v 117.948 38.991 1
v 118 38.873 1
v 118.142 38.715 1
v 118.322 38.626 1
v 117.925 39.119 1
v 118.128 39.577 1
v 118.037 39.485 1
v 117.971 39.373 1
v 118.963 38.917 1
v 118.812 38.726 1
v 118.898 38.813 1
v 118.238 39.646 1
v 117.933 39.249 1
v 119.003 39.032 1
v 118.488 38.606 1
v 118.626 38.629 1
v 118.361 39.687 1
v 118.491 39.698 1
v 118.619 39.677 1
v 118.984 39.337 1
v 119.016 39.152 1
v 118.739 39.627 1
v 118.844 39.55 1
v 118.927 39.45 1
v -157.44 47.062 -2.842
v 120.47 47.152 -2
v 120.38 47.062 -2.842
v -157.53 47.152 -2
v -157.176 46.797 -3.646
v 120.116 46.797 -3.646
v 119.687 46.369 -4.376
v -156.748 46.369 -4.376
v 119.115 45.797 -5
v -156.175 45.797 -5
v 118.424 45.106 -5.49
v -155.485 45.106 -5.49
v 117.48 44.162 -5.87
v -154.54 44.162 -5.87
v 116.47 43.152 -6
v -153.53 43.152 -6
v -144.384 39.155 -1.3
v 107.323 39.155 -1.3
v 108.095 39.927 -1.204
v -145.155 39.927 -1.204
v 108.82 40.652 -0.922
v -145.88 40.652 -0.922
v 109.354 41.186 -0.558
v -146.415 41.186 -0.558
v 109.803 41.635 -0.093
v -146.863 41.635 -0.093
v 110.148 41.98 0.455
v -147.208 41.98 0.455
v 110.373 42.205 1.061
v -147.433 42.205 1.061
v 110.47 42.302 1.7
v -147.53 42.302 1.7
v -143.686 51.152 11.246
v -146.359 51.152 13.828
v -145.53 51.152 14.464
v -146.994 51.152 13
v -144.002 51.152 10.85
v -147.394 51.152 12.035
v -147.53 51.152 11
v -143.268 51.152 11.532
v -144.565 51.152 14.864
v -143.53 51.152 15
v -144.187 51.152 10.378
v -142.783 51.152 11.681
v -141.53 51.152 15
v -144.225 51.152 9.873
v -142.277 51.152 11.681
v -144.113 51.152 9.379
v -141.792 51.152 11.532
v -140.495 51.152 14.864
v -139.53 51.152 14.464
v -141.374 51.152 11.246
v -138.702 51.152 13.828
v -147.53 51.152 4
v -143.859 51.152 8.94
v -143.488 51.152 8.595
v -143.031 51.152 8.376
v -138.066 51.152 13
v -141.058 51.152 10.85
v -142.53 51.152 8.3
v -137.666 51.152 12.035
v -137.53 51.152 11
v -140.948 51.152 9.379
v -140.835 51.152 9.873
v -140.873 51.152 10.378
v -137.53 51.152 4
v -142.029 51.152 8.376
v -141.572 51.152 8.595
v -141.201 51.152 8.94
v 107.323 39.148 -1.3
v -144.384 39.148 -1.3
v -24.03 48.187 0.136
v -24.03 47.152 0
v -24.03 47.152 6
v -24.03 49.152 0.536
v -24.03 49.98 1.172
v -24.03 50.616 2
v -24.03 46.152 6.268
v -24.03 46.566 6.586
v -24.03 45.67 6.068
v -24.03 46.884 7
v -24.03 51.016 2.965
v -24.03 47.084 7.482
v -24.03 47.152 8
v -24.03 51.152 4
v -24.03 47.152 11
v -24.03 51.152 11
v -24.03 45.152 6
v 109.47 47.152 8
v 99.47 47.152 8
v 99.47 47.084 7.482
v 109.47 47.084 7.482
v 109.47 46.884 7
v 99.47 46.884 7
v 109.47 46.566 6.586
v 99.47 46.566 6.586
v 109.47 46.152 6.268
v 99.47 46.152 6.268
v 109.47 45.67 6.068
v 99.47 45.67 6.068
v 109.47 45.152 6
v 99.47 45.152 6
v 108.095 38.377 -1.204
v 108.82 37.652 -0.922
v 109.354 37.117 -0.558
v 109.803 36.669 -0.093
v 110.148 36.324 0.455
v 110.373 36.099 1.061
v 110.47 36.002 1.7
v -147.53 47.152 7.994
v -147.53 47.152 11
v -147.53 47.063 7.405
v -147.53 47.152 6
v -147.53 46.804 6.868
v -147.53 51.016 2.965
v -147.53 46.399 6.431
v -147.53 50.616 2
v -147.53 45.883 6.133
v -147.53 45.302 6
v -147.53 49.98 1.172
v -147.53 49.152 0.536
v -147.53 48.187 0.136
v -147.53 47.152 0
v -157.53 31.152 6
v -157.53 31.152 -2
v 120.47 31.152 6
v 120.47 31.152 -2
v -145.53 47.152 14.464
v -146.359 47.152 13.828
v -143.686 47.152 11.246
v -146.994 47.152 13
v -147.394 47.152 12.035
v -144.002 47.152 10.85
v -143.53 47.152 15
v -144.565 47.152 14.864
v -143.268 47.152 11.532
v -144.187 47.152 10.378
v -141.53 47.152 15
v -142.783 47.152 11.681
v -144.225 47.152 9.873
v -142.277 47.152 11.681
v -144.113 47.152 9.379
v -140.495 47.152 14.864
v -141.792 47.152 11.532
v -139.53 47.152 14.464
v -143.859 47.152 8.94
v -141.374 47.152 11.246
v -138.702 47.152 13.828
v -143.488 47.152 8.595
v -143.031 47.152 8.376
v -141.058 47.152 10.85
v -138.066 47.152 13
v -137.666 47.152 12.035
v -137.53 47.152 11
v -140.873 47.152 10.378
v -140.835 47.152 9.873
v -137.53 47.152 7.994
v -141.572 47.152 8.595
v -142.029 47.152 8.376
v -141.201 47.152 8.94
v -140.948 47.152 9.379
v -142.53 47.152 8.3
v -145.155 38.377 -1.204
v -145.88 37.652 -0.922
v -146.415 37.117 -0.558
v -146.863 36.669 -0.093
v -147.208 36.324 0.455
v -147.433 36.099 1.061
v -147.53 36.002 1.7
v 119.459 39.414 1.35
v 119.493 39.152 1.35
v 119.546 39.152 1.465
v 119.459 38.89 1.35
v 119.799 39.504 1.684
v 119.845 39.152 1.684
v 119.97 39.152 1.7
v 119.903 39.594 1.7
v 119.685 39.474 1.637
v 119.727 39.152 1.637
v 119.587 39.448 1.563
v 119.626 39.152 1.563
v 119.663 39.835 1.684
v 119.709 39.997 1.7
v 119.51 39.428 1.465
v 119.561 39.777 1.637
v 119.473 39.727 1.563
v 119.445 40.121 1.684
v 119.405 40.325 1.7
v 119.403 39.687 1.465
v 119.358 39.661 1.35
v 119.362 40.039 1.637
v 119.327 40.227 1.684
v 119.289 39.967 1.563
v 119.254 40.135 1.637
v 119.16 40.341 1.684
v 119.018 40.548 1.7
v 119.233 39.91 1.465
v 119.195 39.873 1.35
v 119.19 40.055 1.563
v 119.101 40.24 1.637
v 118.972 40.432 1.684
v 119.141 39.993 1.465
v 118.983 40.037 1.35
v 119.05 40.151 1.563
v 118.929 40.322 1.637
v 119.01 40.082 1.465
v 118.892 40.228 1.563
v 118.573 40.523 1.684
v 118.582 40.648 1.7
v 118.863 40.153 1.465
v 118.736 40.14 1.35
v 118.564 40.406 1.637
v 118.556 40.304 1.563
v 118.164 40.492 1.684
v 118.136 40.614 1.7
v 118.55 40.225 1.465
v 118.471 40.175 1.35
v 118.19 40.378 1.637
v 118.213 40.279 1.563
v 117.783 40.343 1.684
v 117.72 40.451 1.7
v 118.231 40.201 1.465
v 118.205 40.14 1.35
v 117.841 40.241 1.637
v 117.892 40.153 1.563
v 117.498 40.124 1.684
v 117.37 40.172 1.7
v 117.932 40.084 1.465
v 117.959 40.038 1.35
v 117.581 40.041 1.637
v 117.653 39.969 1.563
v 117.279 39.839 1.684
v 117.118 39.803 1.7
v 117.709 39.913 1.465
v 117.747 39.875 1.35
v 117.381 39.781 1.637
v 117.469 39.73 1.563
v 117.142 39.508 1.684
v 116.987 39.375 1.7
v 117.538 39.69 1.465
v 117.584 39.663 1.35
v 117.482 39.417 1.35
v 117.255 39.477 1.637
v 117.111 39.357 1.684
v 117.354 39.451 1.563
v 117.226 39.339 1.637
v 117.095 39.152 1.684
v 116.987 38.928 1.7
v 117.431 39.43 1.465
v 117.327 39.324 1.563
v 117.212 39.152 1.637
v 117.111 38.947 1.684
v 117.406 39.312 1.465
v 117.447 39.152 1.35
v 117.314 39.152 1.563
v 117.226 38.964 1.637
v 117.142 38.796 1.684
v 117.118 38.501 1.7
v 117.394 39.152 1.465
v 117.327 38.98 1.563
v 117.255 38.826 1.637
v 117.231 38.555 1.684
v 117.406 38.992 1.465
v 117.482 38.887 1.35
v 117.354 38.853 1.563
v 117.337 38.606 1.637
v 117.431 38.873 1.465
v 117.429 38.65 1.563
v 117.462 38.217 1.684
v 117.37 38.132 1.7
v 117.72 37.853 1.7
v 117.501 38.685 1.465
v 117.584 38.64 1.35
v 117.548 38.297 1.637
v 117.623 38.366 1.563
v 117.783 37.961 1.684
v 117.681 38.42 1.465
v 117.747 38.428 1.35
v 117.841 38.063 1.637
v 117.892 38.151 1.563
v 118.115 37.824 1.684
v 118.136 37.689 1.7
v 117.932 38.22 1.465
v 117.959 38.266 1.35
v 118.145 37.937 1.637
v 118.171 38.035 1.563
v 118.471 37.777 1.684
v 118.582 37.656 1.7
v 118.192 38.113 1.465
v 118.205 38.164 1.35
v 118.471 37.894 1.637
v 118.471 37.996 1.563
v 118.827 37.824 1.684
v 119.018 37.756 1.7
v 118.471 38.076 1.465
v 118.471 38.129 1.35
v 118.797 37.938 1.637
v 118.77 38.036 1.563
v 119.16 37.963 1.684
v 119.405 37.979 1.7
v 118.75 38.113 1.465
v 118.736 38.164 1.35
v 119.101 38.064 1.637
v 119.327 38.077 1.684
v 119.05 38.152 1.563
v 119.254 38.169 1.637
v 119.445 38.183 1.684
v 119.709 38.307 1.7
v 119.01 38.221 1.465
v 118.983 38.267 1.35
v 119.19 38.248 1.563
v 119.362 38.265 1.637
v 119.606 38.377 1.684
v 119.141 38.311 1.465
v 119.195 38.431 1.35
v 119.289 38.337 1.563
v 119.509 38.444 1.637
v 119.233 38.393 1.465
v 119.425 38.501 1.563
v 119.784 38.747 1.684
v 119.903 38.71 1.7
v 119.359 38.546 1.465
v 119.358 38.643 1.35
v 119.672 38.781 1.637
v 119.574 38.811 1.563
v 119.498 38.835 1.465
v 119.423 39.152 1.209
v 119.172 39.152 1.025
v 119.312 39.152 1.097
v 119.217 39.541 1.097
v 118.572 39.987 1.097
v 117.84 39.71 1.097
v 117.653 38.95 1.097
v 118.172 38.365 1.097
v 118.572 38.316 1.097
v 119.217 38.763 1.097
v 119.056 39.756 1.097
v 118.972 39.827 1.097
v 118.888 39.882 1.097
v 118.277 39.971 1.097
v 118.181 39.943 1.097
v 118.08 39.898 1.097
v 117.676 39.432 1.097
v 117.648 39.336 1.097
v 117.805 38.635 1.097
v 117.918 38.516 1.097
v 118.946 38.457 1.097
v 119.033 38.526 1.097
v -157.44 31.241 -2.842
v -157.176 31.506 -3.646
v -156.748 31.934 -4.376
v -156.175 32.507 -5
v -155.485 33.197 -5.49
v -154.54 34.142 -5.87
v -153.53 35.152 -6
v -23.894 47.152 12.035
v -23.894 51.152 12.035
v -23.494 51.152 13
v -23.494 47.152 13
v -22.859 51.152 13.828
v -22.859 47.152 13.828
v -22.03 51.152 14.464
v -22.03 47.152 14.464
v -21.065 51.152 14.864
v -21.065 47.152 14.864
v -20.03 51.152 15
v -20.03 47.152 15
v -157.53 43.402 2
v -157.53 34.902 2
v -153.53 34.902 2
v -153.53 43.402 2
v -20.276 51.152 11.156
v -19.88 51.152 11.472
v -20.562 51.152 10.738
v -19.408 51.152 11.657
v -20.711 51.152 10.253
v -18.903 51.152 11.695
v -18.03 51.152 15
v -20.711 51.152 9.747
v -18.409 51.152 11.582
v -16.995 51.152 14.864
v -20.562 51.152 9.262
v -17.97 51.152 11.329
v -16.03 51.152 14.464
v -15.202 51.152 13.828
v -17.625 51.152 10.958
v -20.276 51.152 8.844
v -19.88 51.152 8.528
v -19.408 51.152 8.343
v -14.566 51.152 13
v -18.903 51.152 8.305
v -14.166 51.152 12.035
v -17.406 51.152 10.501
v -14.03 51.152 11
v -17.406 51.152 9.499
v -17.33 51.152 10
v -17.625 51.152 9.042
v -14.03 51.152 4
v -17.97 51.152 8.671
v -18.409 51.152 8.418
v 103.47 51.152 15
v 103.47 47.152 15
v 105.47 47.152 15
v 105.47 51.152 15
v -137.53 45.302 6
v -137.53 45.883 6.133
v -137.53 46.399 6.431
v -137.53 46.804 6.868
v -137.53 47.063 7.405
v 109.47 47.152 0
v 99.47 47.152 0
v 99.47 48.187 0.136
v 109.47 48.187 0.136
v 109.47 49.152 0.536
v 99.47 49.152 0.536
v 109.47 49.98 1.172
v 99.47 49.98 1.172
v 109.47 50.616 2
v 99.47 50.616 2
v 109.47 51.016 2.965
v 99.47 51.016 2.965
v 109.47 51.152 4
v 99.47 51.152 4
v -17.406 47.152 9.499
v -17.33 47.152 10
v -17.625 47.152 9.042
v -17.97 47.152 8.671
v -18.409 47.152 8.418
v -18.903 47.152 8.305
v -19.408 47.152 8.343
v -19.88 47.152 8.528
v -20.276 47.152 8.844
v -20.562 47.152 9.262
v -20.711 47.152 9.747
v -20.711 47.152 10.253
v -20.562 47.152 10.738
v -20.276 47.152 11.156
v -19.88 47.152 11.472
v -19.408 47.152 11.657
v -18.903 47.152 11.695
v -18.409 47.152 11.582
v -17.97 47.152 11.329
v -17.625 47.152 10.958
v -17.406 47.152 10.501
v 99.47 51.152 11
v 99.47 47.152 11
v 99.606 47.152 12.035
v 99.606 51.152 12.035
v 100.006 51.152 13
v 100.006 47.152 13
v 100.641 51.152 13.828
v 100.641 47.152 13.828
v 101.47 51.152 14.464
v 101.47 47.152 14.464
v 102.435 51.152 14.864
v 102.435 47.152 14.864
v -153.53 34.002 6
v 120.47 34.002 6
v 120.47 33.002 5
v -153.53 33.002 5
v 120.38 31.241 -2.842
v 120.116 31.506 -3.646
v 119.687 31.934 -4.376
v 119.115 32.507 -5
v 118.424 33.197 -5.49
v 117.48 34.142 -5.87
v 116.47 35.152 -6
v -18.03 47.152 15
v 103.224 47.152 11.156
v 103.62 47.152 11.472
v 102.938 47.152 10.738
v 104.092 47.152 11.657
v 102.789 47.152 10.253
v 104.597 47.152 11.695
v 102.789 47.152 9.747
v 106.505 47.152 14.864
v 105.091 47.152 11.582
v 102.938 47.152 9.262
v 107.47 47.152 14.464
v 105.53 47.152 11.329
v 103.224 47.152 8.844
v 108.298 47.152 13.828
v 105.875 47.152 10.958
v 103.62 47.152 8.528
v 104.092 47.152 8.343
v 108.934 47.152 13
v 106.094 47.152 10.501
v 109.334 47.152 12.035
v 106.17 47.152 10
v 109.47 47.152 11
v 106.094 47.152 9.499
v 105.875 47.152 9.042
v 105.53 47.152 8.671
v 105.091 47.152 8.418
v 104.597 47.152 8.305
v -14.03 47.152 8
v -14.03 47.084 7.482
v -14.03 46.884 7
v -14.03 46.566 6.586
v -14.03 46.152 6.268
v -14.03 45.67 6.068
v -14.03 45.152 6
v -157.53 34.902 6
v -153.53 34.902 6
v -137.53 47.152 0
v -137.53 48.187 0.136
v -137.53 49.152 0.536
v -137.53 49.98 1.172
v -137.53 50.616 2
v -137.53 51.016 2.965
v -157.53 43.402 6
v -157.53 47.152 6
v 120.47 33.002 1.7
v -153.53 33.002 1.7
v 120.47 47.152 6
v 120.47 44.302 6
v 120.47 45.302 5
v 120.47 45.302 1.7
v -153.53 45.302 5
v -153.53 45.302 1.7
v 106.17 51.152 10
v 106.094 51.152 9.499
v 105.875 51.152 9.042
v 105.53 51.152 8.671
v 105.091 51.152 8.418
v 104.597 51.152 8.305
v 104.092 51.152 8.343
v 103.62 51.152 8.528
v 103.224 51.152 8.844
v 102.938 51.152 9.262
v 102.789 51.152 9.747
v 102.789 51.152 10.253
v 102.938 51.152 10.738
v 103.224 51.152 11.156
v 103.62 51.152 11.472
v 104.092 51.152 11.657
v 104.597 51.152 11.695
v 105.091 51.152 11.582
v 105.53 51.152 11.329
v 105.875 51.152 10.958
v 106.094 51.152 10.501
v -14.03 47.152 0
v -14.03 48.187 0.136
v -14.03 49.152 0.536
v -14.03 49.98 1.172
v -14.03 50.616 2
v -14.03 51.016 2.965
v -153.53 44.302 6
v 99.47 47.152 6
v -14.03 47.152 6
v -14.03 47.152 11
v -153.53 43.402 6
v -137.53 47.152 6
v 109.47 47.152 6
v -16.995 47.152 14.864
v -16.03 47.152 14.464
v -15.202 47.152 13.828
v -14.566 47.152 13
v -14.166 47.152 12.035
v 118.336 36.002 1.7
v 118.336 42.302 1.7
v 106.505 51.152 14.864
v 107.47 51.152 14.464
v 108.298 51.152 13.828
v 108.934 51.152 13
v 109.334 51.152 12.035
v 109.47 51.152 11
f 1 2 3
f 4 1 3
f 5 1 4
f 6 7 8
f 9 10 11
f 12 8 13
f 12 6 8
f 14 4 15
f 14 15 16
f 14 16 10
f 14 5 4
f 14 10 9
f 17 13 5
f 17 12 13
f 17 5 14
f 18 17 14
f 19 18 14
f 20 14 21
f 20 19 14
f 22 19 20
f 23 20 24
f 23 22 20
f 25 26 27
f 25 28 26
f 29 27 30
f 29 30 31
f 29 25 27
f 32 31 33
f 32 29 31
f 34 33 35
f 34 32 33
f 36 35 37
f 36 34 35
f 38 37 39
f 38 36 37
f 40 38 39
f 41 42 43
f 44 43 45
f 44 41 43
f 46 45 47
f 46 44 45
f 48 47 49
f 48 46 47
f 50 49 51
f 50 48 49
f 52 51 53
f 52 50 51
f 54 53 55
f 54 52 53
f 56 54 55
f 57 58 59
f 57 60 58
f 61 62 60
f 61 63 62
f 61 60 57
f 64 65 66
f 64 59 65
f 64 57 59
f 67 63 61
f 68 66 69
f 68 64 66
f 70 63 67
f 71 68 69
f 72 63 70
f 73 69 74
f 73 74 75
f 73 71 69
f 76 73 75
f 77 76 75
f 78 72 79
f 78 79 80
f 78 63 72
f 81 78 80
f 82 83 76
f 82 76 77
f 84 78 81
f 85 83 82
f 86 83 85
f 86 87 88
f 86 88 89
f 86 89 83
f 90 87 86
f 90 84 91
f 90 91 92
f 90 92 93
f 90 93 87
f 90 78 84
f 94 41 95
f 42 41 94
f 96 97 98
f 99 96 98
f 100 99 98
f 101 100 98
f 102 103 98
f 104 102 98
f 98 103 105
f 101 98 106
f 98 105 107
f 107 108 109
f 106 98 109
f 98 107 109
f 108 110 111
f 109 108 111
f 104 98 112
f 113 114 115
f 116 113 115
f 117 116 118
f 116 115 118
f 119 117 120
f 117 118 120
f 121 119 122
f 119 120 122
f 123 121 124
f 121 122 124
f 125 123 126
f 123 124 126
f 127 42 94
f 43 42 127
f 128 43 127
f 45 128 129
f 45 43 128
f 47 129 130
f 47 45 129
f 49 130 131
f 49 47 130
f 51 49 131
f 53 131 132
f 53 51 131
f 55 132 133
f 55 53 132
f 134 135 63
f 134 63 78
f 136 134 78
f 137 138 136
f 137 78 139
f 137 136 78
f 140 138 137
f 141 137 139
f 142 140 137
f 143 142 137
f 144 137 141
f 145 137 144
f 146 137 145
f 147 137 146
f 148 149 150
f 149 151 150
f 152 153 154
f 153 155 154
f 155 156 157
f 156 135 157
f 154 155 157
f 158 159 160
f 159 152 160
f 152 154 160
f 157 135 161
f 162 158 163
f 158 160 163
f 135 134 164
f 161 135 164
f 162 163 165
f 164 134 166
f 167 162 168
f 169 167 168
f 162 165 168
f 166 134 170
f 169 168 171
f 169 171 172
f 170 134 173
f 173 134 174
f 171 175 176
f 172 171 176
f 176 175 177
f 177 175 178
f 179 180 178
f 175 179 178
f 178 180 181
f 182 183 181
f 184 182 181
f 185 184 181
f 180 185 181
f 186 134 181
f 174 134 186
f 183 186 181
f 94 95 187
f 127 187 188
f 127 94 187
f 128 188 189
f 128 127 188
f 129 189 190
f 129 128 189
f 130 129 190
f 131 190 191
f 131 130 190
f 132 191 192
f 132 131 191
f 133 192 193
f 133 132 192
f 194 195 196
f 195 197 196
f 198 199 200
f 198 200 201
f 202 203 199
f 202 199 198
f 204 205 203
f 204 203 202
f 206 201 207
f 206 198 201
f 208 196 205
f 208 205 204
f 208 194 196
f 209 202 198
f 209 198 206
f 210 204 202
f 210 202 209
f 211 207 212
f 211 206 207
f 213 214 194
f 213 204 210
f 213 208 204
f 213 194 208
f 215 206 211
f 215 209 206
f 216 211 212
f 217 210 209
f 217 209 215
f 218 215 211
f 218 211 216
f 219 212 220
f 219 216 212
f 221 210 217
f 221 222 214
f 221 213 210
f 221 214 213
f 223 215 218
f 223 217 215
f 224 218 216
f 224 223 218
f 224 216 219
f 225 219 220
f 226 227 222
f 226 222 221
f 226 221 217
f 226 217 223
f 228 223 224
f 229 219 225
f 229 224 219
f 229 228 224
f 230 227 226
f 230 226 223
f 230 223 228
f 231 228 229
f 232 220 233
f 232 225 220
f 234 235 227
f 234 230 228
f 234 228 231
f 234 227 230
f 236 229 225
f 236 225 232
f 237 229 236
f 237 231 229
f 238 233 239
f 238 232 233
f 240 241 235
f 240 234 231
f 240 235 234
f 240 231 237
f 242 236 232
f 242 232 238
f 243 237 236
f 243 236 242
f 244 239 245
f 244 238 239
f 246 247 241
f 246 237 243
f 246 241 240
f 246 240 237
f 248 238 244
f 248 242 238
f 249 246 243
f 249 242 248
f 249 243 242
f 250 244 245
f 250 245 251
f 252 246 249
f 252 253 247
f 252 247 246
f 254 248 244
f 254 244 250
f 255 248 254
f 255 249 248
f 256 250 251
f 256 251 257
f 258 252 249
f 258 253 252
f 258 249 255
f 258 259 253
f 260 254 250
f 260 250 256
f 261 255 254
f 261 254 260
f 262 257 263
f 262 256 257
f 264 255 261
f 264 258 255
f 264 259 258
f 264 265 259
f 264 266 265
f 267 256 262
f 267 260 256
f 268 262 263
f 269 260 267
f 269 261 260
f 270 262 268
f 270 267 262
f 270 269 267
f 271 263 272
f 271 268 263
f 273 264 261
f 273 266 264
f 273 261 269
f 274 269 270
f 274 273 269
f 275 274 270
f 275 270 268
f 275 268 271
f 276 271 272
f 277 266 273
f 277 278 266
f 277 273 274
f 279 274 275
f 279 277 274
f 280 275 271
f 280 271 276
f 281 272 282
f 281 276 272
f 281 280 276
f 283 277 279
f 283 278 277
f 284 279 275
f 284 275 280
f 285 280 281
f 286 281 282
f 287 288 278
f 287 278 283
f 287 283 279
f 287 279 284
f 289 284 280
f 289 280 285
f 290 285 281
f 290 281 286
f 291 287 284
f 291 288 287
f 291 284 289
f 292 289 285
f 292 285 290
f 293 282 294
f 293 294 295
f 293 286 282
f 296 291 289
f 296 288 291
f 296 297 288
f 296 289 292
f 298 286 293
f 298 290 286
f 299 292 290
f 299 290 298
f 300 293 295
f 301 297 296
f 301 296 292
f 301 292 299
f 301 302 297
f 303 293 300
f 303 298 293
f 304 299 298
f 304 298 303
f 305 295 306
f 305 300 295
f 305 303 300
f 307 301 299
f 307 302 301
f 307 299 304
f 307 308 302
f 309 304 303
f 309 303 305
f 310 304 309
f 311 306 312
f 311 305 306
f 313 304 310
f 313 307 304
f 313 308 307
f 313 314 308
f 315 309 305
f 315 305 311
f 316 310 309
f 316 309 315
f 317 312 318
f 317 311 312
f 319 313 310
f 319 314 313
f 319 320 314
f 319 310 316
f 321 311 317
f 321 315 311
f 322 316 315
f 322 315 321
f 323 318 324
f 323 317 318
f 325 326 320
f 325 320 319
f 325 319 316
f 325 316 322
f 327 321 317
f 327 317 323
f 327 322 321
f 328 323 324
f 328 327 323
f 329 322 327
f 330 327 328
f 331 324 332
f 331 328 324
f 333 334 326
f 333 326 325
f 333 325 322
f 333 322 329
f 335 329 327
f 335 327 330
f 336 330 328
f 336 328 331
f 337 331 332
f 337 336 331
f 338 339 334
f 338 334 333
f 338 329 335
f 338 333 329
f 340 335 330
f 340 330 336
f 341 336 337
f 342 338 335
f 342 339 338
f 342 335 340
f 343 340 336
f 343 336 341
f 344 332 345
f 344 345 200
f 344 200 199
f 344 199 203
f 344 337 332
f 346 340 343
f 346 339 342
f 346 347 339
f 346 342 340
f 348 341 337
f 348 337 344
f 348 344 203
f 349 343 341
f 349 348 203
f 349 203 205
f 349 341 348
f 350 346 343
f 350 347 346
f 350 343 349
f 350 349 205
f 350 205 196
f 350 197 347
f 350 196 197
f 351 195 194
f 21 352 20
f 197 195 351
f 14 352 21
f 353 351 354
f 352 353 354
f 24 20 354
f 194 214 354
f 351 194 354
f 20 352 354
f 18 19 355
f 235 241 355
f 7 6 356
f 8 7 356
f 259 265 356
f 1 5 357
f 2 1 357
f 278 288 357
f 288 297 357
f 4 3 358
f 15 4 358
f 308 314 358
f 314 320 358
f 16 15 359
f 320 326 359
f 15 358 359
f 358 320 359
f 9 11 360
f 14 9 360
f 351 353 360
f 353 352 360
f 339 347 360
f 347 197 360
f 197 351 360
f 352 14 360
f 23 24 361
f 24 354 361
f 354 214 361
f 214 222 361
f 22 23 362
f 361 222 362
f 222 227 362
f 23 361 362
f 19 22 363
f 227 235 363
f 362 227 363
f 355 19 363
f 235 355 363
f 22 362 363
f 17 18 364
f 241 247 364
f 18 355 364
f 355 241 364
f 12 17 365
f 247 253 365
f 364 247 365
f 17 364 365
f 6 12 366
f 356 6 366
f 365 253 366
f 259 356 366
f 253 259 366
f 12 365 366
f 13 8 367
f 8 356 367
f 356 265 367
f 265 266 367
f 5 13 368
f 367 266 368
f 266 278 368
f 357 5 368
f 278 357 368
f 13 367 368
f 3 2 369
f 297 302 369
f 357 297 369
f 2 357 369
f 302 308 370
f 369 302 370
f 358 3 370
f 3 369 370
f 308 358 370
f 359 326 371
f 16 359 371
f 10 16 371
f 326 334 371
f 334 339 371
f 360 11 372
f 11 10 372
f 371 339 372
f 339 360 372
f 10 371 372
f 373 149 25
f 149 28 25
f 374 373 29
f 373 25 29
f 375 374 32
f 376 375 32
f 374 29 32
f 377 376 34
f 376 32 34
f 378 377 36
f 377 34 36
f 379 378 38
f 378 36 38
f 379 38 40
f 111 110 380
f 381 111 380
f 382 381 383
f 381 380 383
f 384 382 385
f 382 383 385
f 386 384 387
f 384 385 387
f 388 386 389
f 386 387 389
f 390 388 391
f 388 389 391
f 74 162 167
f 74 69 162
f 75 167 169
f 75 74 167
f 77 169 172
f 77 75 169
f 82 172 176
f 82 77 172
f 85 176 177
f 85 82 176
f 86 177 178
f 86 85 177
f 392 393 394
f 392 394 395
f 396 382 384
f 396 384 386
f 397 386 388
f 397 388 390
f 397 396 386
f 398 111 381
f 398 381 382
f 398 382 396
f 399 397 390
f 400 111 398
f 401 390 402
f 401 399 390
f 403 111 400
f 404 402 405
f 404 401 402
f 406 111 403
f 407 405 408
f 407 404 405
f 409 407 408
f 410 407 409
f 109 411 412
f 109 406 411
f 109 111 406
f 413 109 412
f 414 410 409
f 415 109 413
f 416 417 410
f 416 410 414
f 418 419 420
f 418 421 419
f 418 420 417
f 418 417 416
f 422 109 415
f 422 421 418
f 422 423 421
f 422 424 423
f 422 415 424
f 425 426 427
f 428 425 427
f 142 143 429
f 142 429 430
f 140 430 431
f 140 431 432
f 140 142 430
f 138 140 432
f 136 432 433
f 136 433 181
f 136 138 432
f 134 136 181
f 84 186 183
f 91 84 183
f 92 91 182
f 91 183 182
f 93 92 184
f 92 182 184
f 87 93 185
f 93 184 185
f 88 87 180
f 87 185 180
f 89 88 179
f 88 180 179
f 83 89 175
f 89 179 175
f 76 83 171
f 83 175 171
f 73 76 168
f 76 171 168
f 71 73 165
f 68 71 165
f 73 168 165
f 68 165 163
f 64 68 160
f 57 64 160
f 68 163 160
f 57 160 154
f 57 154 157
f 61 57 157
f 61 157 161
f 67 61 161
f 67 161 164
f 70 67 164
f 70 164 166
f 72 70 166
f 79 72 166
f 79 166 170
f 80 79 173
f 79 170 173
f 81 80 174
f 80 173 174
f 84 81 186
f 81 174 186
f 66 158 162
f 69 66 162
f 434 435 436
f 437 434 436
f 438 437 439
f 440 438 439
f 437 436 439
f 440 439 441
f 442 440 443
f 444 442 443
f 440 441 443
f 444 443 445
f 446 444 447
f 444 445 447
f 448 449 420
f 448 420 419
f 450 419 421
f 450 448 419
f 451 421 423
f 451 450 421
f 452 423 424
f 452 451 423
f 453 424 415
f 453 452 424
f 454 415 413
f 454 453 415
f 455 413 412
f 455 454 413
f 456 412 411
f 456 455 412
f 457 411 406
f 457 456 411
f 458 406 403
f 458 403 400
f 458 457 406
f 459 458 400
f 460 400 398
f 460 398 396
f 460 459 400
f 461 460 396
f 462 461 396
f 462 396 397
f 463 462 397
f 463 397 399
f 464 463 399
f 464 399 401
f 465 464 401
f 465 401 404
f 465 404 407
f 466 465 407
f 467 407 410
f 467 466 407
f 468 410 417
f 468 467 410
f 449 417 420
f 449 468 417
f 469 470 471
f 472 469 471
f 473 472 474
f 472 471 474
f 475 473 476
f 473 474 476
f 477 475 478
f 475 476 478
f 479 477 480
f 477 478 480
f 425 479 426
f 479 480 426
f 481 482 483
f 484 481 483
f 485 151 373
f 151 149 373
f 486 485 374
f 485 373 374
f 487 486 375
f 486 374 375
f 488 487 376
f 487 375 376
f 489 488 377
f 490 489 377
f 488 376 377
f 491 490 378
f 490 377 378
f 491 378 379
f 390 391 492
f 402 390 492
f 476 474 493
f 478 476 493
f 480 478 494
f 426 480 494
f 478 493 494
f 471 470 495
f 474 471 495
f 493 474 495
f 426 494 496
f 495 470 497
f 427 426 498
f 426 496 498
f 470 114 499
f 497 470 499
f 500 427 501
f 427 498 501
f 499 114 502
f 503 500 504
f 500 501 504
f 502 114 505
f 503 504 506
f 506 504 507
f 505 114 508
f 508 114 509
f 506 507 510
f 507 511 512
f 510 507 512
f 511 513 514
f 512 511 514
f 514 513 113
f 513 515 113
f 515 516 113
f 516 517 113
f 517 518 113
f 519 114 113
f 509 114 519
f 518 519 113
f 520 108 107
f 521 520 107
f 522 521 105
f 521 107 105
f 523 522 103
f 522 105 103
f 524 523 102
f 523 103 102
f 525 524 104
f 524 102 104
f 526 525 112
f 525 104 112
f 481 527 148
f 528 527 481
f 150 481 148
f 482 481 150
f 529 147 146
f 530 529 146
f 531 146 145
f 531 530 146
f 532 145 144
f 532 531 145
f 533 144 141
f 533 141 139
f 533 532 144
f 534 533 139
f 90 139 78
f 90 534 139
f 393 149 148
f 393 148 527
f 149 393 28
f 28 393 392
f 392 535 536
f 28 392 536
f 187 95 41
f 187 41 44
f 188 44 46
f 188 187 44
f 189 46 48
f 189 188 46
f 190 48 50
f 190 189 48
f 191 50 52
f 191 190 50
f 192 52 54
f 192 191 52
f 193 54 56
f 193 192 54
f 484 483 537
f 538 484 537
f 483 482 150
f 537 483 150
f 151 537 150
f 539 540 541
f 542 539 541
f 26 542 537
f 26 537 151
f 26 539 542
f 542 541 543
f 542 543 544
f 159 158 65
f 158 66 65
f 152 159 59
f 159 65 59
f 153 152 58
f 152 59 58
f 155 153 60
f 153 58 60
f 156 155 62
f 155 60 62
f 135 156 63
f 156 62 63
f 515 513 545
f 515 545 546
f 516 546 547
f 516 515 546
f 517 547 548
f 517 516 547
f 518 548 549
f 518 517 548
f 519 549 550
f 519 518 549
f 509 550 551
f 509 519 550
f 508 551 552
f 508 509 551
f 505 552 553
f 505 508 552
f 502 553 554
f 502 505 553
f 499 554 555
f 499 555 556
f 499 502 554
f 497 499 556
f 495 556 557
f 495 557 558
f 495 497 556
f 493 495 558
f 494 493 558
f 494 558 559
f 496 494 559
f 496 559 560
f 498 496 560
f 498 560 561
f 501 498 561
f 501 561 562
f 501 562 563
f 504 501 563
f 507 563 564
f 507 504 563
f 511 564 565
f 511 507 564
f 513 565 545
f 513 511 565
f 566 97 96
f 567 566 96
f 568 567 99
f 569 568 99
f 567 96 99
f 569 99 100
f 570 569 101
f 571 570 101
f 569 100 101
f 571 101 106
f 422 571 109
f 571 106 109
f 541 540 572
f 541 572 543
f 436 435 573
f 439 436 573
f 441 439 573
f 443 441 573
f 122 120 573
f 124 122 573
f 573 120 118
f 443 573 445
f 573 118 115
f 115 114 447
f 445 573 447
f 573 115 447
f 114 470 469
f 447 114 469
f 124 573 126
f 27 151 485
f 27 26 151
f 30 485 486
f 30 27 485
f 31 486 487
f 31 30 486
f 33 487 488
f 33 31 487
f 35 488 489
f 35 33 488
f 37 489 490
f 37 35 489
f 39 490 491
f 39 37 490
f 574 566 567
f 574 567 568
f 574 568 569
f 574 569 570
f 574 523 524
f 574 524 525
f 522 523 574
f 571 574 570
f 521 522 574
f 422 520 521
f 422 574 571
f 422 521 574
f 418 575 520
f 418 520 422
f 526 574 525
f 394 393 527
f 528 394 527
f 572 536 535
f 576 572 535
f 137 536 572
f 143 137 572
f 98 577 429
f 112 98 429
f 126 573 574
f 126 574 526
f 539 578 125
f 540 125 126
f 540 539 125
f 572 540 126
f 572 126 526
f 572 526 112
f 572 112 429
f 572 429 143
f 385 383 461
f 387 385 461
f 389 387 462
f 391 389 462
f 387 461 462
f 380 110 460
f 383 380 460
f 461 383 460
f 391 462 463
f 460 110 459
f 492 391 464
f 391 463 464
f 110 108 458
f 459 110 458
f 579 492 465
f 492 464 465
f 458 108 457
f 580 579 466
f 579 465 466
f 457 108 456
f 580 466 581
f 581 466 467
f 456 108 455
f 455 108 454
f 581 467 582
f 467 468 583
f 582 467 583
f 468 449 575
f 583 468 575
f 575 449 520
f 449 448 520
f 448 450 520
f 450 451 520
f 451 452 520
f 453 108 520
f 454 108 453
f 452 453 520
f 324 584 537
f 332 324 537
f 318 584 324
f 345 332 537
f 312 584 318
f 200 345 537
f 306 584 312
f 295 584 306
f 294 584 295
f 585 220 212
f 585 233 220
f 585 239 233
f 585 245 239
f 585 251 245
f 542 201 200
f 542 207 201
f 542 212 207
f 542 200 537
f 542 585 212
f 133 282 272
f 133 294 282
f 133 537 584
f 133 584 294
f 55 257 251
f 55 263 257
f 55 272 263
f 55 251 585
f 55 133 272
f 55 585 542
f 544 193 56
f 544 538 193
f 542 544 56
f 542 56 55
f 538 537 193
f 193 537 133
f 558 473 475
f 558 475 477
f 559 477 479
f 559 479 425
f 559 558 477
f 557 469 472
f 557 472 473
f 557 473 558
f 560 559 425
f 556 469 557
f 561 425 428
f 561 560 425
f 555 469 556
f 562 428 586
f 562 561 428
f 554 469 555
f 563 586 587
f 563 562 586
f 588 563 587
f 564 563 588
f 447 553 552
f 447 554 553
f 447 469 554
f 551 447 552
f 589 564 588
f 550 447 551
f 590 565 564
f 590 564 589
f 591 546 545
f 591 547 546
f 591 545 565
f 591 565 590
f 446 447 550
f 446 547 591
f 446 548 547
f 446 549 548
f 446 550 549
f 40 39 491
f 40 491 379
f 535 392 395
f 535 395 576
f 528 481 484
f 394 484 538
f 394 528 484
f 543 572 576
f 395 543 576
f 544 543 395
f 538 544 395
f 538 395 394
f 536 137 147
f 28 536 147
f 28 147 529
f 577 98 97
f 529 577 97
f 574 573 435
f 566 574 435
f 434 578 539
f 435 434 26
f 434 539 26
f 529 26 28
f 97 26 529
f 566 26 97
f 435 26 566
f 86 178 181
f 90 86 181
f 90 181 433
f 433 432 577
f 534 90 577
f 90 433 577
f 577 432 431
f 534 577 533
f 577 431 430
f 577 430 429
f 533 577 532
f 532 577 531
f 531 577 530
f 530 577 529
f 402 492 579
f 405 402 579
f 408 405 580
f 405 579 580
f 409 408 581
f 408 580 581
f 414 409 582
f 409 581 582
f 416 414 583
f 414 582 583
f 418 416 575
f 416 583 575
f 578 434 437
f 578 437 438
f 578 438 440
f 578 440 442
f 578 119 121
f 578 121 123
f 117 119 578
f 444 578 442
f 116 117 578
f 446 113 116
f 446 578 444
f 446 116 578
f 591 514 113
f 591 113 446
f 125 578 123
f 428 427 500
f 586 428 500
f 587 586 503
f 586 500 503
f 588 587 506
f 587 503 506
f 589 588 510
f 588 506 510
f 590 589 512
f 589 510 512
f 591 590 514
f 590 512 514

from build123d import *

# Parameters (mm, degrees)
SKETCH1_W               = 278
SKETCH1_H               = 16
BOSS_EXTRUDE1_DEPTH     = 6
CUT_EXTRUDE1_DEPTH      = 283.034214474
CUT_EXTRUDE1_DEPTH_BACK = 274
SKETCH3_W               = 4.3
SKETCH3_H               = 12.3
SKETCH13_W              = 10
SKETCH13_H              = 15
BOSS_EXTRUDE5_DEPTH     = 4
FILLET10_R              = 4
SKETCH14_R              = 1.7
CUT_EXTRUDE5_DEPTH      = 4
FILLET11_R              = 4
FILLET12_R              = 4
FILLET22_R              = 2
SKETCH17_W              = 278
SKETCH17_H              = 16
BOSS_EXTRUDE6_DEPTH     = 6
FILLET25_R              = 4
SKETCH18_R              = 1
CUT_EXTRUDE6_DEPTH      = 0.7
FILLET26_R              = 0.5
FILLET27_R              = 0.5
SKETCH21_W              = 4
SKETCH21_H              = 8.5
CUT_EXTRUDE10_DEPTH     = 4
BOSS_EXTRUDE9_DEPTH     = 274
SKETCH27_W              = 258
SKETCH27_H              = 6.3
CUT_EXTRUDE11_DEPTH     = 3
FILLET30_R              = 3.15
LPATTERN2_START         = 47.151862464
LPATTERN2_OUTLINE_R     = 1.7
LPATTERN2_DEPTH         = 4
LPATTERN2_START_2       = -24.03008596
LPATTERN2_2_DEPTH       = 10
LPATTERN2_START_3       = 99.46991404
LPATTERN2_3_DEPTH       = 10


with BuildPart() as part:
    # Sketch1 → Boss-Extrude1 (new body)
    with BuildSketch(Plane.XY):
        with Locations((-18.53008596, 39.151862464)):
            Rectangle(SKETCH1_W, SKETCH1_H)
    extrude(amount=BOSS_EXTRUDE1_DEPTH)

    # Sketch3 → Cut-Extrude1 (cut, two sides: drawn at the far end of the back side and taken through both)
    with BuildSketch(Plane(origin=(120.46991404, 0, 0), x_dir=(0, 0, -1), z_dir=(1, 0, 0)).offset(-CUT_EXTRUDE1_DEPTH_BACK)):
        with Locations((-3.85, 39.151862464)):
            Rectangle(SKETCH3_W, SKETCH3_H)
    extrude(amount=CUT_EXTRUDE1_DEPTH + CUT_EXTRUDE1_DEPTH_BACK, mode=Mode.SUBTRACT)

    # Sketch13 → Boss-Extrude5 (add)
    with BuildSketch(Plane(origin=(0, 47.151862464, 0), x_dir=(1, 0, 0), z_dir=(0, 1, 0))):
        with Locations((-142.53008596, -7.5)):
            Rectangle(SKETCH13_W, SKETCH13_H)
    extrude(amount=BOSS_EXTRUDE5_DEPTH)

    # Fillet10
    fillet10_edges = [part.edges().sort_by_distance(p)[0] for p in [
        (-142.53008596, 51.151862464, 0),
    ]]
    fillet(fillet10_edges, radius=FILLET10_R)

    # Sketch14 → Cut-Extrude5 (cut)
    with BuildSketch(Plane.XZ.offset(-47.151862464)):
        with Locations(Location((-142.53008596, 10, 0), (0, 0, 270))):
            Circle(SKETCH14_R)
    extrude(amount=-CUT_EXTRUDE5_DEPTH, mode=Mode.SUBTRACT)

    # Fillet11
    fillet11_edges = [part.edges().sort_by_distance(p)[0] for p in [
        (-137.53008596, 49.151862464, 15),
    ]]
    fillet(fillet11_edges, radius=FILLET11_R)

    # Fillet12
    fillet12_edges = [part.edges().sort_by_distance(p)[0] for p in [
        (-147.53008596, 49.151862464, 15),
    ]]
    fillet(fillet12_edges, radius=FILLET12_R)

    # Fillet22
    # the kernel refuses this fillet: 2 mm, written as the material it adds along each edge
    with BuildSketch(Plane(origin=(-147.53008596, 47.151862464, 6), x_dir=(0, 0, 1), z_dir=(1, 0, 0))) as fillet22_piece_1:
        with BuildLine():
            CenterArc((1.994367068, 2), FILLET22_R, 184.301222305, 85.698777695)
            Line((0, 1.85), (0, 0))
            Line((0, 0), (1.994367068, 0))
        make_face()
    extrude(amount=10)

    # Sketch17 → Boss-Extrude6 (add)
    with BuildSketch(Plane(origin=(0, 0, 0), x_dir=(-1, 0, 0), z_dir=(0, 0, -1))):
        with Locations((18.53008596, 39.151862464)):
            Rectangle(SKETCH17_W, SKETCH17_H)
    extrude(amount=BOSS_EXTRUDE6_DEPTH)

    # Fillet25
    fillet25_edges = [part.edges().sort_by_distance(p)[0] for p in [
        (120.46991404, 39.151862464, -6),
        (-18.53008596, 31.151862464, -6),
        (-157.53008596, 39.151862464, -6),
        (-18.53008596, 47.151862464, -6),
    ]]
    fillet(fillet25_edges, radius=FILLET25_R)

    # Sketch18 → Cut-Extrude6 (cut)
    with BuildSketch(Plane.XY.offset(1.7)):
        with Locations((118.46991404, 39.151862464)):
            Circle(SKETCH18_R)
    extrude(amount=-CUT_EXTRUDE6_DEPTH, mode=Mode.SUBTRACT)

    # Fillet26
    fillet26_edges = [part.edges().sort_by_distance(p)[0] for p in [
        (117.46991404, 39.151862464, 1.7),
    ]]
    fillet(fillet26_edges, radius=FILLET26_R)

    # Fillet27
    fillet27_edges = [part.edges().sort_by_distance(p)[0] for p in [
        (117.46991404, 39.151862464, 1),
    ]]
    fillet(fillet27_edges, radius=FILLET27_R)

    # Sketch21 → Cut-Extrude10 (cut)
    with BuildSketch(Plane.ZY.offset(157.53008596)):
        with Locations((4, 39.151862464)):
            Rectangle(SKETCH21_W, SKETCH21_H)
    extrude(amount=-CUT_EXTRUDE10_DEPTH, mode=Mode.SUBTRACT)

    # Sketch26 → Boss-Extrude9 (add)
    with BuildSketch(Plane(origin=(120.46991404, 0, 0), x_dir=(0, 0, -1), z_dir=(1, 0, 0))):
        Polygon((-6, 45.301862464), (-6, 44.301862464), (-5, 45.301862464), align=None)
        Polygon((-6, 33.001862464), (-6, 34.001862464), (-5, 33.001862464), align=None)
    extrude(amount=-BOSS_EXTRUDE9_DEPTH)

    # Sketch27 → Cut-Extrude11 (cut)
    with BuildSketch(Plane.XY.offset(1.7)):
        with Locations((-18.53008596, 39.151862464)):
            Rectangle(SKETCH27_W, SKETCH27_H)
    extrude(amount=-CUT_EXTRUDE11_DEPTH, mode=Mode.SUBTRACT)

    # Fillet30
    # the kernel refuses this fillet: 3.15 mm, written as the material it adds along each edge
    with BuildSketch(Plane(origin=(-155.396152321, 42.301862464, -1.3), x_dir=(0, 0, 1), z_dir=(1, 0, 0)), Plane(origin=(118.335980401, 36.001862464, -1.3), x_dir=(0, 0, 1), z_dir=(-1, 0, 0))) as fillet30_piece_1:
        with BuildLine():
            CenterArc((3.15, 3.146426545), FILLET30_R, 180, 87.270597363)
            Line((0, 3.146426545), (0, 0))
            Line((0, 0), (3, 0))
        make_face()
    extrude(amount=273.732132723)
    with BuildSketch(Plane(origin=(110.46991404, 50.167928825, -1.3), x_dir=(0, 0, 1), z_dir=(0, -1, 0))) as fillet30_piece_2_section:
        with BuildLine():
            CenterArc((3.15, 3.146426545), FILLET30_R, 180, 87.270597363)
            Line((0, 3.146426545), (0, 0))
            Line((0, 0), (3, 0))
        make_face()
    fillet30_piece_2 = extrude(amount=22.032132723, mode=Mode.PRIVATE)
    fillet30_piece_2 = split(fillet30_piece_2, bisect_by=Plane(origin=(110.46991404, 31.151862464, -1.3), z_dir=(0, 1, 0)), keep=Keep.TOP, mode=Mode.PRIVATE)
    fillet30_piece_2 = split(fillet30_piece_2, bisect_by=Plane(origin=(110.46991404, 47.151862464, -1.3), z_dir=(0, -1, 0)), keep=Keep.TOP, mode=Mode.PRIVATE)
    add(fillet30_piece_2)
    with BuildSketch(Plane(origin=(-147.53008596, 28.135796103, -1.3), x_dir=(0, 0, 1), z_dir=(0, 1, 0))) as fillet30_piece_3_section:
        with BuildLine():
            CenterArc((3.15, 3.146426545), FILLET30_R, 180, 87.270597363)
            Line((0, 3.146426545), (0, 0))
            Line((0, 0), (3, 0))
        make_face()
    fillet30_piece_3 = extrude(amount=22.032132723, mode=Mode.PRIVATE)
    fillet30_piece_3 = split(fillet30_piece_3, bisect_by=Plane(origin=(-147.53008596, 31.151862464, -1.3), z_dir=(0, 1, 0)), keep=Keep.TOP, mode=Mode.PRIVATE)
    fillet30_piece_3 = split(fillet30_piece_3, bisect_by=Plane(origin=(-147.53008596, 47.151862464, -1.3), z_dir=(0, -1, 0)), keep=Keep.TOP, mode=Mode.PRIVATE)
    add(fillet30_piece_3)

    # LPattern2: read off the stored shape, not the designer's step
    # LPattern2 outline → LPattern2 (add)
    # profile 1 of 2: a face of its own
    with BuildSketch(Plane(origin=(0, 0, 0), x_dir=(1, 0, 0), z_dir=(0, 1, 0)).offset(LPATTERN2_START)):
        with BuildLine():
            Line((-14.03008596, -11), (-14.03008596, -6))
            Line((-14.03008596, -6), (-24.03008596, -6))
            Line((-24.03008596, -6), (-24.03008596, -11))
            ThreePointArc((-24.03008596, -11), (-22.858513085, -13.828427125), (-20.03008596, -15))
            Line((-20.03008596, -15), (-18.03008596, -15))
            ThreePointArc((-18.03008596, -15), (-15.201658835, -13.828427125), (-14.03008596, -11))
        make_face()
        with Locations((-19.03008596, -10)):
            Circle(LPATTERN2_OUTLINE_R, mode=Mode.SUBTRACT)
    # profile 2 of 2: a face of its own
    with BuildSketch(Plane(origin=(0, 0, 0), x_dir=(1, 0, 0), z_dir=(0, 1, 0)).offset(LPATTERN2_START)):
        with BuildLine():
            Line((103.46991404, -15), (105.46991404, -15))
            ThreePointArc((105.46991404, -15), (108.298341165, -13.828427125), (109.46991404, -11))
            Line((109.46991404, -11), (109.46991404, -6))
            Line((109.46991404, -6), (99.46991404, -6))
            Line((99.46991404, -6), (99.46991404, -11))
            ThreePointArc((99.46991404, -11), (100.641486915, -13.828427125), (103.46991404, -15))
        make_face()
        with Locations((104.46991404, -10)):
            Circle(LPATTERN2_OUTLINE_R, mode=Mode.SUBTRACT)
    extrude(amount=LPATTERN2_DEPTH)

    # LPattern2 2 outline → LPattern2 2 (add)
    with BuildSketch(Plane.YZ.offset(LPATTERN2_START_2)):
        with BuildLine():
            Line((45.151862464, 6), (47.151862464, 6))
            Line((47.151862464, 6), (47.151862464, 8))
            ThreePointArc((47.151862464, 8), (46.566076026, 6.585786437), (45.151862464, 6))
        make_face()
        with BuildLine():
            Line((51.151862464, 4), (51.151862464, 6))
            Line((51.151862464, 6), (47.151862464, 6))
            Line((47.151862464, 6), (47.151862464, 0))
            ThreePointArc((47.151862464, 0), (49.980289589, 1.171572875), (51.151862464, 4))
        make_face()
    extrude(amount=LPATTERN2_2_DEPTH)

    # LPattern2 3 outline → LPattern2 3 (add)
    with BuildSketch(Plane.YZ.offset(LPATTERN2_START_3)):
        with BuildLine():
            Line((45.151862464, 6), (47.151862464, 6))
            Line((47.151862464, 6), (47.151862464, 8))
            ThreePointArc((47.151862464, 8), (46.566076026, 6.585786437), (45.151862464, 6))
        make_face()
        with BuildLine():
            Line((51.151862464, 4), (51.151862464, 6))
            Line((51.151862464, 6), (47.151862464, 6))
            Line((47.151862464, 6), (47.151862464, 0))
            ThreePointArc((47.151862464, 0), (49.980289589, 1.171572875), (51.151862464, 4))
        make_face()
    extrude(amount=LPATTERN2_3_DEPTH)


solid = part.part
